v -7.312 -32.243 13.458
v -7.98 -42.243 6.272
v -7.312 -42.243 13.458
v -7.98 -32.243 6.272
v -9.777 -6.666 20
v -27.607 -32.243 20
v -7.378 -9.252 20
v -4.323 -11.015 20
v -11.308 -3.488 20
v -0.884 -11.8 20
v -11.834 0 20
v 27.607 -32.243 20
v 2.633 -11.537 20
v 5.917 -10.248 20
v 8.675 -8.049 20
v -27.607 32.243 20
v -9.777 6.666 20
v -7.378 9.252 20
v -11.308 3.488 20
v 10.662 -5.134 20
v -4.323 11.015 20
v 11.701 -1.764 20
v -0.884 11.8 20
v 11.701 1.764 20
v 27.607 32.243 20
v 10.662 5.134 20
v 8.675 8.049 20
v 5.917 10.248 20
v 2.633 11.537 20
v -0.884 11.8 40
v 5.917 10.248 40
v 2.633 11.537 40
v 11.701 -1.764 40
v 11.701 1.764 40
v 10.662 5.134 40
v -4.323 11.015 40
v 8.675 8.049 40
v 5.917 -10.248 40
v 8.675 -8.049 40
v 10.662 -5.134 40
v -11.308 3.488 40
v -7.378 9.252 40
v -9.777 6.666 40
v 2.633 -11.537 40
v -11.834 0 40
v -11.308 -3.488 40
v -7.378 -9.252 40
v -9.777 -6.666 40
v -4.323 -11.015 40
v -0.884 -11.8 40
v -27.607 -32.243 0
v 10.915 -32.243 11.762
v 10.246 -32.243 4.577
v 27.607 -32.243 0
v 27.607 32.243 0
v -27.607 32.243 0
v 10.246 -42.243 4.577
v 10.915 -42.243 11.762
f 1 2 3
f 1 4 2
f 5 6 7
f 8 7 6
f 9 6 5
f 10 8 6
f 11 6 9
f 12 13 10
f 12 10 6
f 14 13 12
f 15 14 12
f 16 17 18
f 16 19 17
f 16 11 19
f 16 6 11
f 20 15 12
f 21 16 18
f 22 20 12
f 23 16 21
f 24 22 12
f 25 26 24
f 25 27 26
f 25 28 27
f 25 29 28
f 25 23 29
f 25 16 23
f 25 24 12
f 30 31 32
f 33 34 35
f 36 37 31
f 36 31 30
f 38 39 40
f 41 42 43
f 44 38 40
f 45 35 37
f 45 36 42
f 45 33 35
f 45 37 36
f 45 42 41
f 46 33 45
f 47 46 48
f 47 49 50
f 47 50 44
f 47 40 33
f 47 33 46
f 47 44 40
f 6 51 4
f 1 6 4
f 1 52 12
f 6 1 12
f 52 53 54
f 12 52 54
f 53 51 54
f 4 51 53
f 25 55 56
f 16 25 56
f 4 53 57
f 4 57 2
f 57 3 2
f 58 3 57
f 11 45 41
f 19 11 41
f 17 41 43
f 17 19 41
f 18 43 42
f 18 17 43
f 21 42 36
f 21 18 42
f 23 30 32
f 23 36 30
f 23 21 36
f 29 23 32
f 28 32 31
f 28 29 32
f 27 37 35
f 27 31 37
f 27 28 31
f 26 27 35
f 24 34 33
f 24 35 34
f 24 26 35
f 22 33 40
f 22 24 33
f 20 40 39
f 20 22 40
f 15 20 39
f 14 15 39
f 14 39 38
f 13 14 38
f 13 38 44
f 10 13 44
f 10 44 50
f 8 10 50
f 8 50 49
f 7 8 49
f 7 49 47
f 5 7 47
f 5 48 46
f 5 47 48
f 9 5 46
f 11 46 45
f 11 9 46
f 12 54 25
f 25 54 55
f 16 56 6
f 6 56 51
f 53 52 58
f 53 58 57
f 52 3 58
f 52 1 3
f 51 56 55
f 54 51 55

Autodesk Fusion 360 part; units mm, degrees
sketch "Sketch1" plane through (0, 0, 0) normal (0, 0, 1) x (1, 0, 0)
  line L0 (27.6067, 32.2429) -> (-27.6067, 32.2429)
  line L1 (-27.6067, 32.2429) -> (-27.6067, -32.2429)
  line L2 (-27.6067, -32.2429) -> (27.6067, -32.2429)
  line L3 (27.6067, -32.2429) -> (27.6067, 32.2429)
  line L4 (27.6067, 32.2429) -> (-27.6067, -32.2429) construction
  line L5 (-27.6067, 32.2429) -> (27.6067, -32.2429) construction
extrude "Extrude1" add sketch "Sketch1" along normal blind 20
sketch "Sketch2" plane through (0, 0, 20) normal (0, 0, 1) x (-1, 0, 0)
  line L0 (-27.6067, 32.2429) -> (-27.6067, -32.2429)
  line L1 (-27.6067, -32.2429) -> (27.6067, -32.2429)
  line L2 (27.6067, -32.2429) -> (27.6067, 32.2429)
  line L3 (27.6067, 32.2429) -> (-27.6067, 32.2429)
  circle A0 centre (0, 0) radius 11.8335
extrude "Extrude2" add sketch "Sketch2" along normal blind 20 contours A0
sketch "Sketch4" plane through (0, -32.2429, 0) normal (0, -1, 0) x (1, 0, 0)
  line L0 (-27.6067, 0) -> (27.6067, 0)
  line L1 (27.6067, 0) -> (27.6067, 20)
  line L2 (27.6067, 20) -> (-27.6067, 20)
  line L3 (-27.6067, 20) -> (-27.6067, 0)
  line L4 (-7.3118, 13.4579) -> (10.9147, 11.7624)
  line L5 (10.9147, 11.7624) -> (10.2462, 4.5769)
  line L6 (10.2462, 4.5769) -> (-7.9802, 6.2724)
  line L7 (-7.9802, 6.2724) -> (-7.3118, 13.4579)
extrude "Extrude4" add sketch "Sketch4" along normal blind 10 contours L4 L5 L6 L7
sketch "Sketch3" plane through (0, 0, 40) normal (0, 0, 1) x (-1, 0, 0)
  circle A0 centre (0, 0) radius 11.8335
  circle A1 centre (0, 0) radius 4.7343
extrude "Extrude3" [suppressed]
